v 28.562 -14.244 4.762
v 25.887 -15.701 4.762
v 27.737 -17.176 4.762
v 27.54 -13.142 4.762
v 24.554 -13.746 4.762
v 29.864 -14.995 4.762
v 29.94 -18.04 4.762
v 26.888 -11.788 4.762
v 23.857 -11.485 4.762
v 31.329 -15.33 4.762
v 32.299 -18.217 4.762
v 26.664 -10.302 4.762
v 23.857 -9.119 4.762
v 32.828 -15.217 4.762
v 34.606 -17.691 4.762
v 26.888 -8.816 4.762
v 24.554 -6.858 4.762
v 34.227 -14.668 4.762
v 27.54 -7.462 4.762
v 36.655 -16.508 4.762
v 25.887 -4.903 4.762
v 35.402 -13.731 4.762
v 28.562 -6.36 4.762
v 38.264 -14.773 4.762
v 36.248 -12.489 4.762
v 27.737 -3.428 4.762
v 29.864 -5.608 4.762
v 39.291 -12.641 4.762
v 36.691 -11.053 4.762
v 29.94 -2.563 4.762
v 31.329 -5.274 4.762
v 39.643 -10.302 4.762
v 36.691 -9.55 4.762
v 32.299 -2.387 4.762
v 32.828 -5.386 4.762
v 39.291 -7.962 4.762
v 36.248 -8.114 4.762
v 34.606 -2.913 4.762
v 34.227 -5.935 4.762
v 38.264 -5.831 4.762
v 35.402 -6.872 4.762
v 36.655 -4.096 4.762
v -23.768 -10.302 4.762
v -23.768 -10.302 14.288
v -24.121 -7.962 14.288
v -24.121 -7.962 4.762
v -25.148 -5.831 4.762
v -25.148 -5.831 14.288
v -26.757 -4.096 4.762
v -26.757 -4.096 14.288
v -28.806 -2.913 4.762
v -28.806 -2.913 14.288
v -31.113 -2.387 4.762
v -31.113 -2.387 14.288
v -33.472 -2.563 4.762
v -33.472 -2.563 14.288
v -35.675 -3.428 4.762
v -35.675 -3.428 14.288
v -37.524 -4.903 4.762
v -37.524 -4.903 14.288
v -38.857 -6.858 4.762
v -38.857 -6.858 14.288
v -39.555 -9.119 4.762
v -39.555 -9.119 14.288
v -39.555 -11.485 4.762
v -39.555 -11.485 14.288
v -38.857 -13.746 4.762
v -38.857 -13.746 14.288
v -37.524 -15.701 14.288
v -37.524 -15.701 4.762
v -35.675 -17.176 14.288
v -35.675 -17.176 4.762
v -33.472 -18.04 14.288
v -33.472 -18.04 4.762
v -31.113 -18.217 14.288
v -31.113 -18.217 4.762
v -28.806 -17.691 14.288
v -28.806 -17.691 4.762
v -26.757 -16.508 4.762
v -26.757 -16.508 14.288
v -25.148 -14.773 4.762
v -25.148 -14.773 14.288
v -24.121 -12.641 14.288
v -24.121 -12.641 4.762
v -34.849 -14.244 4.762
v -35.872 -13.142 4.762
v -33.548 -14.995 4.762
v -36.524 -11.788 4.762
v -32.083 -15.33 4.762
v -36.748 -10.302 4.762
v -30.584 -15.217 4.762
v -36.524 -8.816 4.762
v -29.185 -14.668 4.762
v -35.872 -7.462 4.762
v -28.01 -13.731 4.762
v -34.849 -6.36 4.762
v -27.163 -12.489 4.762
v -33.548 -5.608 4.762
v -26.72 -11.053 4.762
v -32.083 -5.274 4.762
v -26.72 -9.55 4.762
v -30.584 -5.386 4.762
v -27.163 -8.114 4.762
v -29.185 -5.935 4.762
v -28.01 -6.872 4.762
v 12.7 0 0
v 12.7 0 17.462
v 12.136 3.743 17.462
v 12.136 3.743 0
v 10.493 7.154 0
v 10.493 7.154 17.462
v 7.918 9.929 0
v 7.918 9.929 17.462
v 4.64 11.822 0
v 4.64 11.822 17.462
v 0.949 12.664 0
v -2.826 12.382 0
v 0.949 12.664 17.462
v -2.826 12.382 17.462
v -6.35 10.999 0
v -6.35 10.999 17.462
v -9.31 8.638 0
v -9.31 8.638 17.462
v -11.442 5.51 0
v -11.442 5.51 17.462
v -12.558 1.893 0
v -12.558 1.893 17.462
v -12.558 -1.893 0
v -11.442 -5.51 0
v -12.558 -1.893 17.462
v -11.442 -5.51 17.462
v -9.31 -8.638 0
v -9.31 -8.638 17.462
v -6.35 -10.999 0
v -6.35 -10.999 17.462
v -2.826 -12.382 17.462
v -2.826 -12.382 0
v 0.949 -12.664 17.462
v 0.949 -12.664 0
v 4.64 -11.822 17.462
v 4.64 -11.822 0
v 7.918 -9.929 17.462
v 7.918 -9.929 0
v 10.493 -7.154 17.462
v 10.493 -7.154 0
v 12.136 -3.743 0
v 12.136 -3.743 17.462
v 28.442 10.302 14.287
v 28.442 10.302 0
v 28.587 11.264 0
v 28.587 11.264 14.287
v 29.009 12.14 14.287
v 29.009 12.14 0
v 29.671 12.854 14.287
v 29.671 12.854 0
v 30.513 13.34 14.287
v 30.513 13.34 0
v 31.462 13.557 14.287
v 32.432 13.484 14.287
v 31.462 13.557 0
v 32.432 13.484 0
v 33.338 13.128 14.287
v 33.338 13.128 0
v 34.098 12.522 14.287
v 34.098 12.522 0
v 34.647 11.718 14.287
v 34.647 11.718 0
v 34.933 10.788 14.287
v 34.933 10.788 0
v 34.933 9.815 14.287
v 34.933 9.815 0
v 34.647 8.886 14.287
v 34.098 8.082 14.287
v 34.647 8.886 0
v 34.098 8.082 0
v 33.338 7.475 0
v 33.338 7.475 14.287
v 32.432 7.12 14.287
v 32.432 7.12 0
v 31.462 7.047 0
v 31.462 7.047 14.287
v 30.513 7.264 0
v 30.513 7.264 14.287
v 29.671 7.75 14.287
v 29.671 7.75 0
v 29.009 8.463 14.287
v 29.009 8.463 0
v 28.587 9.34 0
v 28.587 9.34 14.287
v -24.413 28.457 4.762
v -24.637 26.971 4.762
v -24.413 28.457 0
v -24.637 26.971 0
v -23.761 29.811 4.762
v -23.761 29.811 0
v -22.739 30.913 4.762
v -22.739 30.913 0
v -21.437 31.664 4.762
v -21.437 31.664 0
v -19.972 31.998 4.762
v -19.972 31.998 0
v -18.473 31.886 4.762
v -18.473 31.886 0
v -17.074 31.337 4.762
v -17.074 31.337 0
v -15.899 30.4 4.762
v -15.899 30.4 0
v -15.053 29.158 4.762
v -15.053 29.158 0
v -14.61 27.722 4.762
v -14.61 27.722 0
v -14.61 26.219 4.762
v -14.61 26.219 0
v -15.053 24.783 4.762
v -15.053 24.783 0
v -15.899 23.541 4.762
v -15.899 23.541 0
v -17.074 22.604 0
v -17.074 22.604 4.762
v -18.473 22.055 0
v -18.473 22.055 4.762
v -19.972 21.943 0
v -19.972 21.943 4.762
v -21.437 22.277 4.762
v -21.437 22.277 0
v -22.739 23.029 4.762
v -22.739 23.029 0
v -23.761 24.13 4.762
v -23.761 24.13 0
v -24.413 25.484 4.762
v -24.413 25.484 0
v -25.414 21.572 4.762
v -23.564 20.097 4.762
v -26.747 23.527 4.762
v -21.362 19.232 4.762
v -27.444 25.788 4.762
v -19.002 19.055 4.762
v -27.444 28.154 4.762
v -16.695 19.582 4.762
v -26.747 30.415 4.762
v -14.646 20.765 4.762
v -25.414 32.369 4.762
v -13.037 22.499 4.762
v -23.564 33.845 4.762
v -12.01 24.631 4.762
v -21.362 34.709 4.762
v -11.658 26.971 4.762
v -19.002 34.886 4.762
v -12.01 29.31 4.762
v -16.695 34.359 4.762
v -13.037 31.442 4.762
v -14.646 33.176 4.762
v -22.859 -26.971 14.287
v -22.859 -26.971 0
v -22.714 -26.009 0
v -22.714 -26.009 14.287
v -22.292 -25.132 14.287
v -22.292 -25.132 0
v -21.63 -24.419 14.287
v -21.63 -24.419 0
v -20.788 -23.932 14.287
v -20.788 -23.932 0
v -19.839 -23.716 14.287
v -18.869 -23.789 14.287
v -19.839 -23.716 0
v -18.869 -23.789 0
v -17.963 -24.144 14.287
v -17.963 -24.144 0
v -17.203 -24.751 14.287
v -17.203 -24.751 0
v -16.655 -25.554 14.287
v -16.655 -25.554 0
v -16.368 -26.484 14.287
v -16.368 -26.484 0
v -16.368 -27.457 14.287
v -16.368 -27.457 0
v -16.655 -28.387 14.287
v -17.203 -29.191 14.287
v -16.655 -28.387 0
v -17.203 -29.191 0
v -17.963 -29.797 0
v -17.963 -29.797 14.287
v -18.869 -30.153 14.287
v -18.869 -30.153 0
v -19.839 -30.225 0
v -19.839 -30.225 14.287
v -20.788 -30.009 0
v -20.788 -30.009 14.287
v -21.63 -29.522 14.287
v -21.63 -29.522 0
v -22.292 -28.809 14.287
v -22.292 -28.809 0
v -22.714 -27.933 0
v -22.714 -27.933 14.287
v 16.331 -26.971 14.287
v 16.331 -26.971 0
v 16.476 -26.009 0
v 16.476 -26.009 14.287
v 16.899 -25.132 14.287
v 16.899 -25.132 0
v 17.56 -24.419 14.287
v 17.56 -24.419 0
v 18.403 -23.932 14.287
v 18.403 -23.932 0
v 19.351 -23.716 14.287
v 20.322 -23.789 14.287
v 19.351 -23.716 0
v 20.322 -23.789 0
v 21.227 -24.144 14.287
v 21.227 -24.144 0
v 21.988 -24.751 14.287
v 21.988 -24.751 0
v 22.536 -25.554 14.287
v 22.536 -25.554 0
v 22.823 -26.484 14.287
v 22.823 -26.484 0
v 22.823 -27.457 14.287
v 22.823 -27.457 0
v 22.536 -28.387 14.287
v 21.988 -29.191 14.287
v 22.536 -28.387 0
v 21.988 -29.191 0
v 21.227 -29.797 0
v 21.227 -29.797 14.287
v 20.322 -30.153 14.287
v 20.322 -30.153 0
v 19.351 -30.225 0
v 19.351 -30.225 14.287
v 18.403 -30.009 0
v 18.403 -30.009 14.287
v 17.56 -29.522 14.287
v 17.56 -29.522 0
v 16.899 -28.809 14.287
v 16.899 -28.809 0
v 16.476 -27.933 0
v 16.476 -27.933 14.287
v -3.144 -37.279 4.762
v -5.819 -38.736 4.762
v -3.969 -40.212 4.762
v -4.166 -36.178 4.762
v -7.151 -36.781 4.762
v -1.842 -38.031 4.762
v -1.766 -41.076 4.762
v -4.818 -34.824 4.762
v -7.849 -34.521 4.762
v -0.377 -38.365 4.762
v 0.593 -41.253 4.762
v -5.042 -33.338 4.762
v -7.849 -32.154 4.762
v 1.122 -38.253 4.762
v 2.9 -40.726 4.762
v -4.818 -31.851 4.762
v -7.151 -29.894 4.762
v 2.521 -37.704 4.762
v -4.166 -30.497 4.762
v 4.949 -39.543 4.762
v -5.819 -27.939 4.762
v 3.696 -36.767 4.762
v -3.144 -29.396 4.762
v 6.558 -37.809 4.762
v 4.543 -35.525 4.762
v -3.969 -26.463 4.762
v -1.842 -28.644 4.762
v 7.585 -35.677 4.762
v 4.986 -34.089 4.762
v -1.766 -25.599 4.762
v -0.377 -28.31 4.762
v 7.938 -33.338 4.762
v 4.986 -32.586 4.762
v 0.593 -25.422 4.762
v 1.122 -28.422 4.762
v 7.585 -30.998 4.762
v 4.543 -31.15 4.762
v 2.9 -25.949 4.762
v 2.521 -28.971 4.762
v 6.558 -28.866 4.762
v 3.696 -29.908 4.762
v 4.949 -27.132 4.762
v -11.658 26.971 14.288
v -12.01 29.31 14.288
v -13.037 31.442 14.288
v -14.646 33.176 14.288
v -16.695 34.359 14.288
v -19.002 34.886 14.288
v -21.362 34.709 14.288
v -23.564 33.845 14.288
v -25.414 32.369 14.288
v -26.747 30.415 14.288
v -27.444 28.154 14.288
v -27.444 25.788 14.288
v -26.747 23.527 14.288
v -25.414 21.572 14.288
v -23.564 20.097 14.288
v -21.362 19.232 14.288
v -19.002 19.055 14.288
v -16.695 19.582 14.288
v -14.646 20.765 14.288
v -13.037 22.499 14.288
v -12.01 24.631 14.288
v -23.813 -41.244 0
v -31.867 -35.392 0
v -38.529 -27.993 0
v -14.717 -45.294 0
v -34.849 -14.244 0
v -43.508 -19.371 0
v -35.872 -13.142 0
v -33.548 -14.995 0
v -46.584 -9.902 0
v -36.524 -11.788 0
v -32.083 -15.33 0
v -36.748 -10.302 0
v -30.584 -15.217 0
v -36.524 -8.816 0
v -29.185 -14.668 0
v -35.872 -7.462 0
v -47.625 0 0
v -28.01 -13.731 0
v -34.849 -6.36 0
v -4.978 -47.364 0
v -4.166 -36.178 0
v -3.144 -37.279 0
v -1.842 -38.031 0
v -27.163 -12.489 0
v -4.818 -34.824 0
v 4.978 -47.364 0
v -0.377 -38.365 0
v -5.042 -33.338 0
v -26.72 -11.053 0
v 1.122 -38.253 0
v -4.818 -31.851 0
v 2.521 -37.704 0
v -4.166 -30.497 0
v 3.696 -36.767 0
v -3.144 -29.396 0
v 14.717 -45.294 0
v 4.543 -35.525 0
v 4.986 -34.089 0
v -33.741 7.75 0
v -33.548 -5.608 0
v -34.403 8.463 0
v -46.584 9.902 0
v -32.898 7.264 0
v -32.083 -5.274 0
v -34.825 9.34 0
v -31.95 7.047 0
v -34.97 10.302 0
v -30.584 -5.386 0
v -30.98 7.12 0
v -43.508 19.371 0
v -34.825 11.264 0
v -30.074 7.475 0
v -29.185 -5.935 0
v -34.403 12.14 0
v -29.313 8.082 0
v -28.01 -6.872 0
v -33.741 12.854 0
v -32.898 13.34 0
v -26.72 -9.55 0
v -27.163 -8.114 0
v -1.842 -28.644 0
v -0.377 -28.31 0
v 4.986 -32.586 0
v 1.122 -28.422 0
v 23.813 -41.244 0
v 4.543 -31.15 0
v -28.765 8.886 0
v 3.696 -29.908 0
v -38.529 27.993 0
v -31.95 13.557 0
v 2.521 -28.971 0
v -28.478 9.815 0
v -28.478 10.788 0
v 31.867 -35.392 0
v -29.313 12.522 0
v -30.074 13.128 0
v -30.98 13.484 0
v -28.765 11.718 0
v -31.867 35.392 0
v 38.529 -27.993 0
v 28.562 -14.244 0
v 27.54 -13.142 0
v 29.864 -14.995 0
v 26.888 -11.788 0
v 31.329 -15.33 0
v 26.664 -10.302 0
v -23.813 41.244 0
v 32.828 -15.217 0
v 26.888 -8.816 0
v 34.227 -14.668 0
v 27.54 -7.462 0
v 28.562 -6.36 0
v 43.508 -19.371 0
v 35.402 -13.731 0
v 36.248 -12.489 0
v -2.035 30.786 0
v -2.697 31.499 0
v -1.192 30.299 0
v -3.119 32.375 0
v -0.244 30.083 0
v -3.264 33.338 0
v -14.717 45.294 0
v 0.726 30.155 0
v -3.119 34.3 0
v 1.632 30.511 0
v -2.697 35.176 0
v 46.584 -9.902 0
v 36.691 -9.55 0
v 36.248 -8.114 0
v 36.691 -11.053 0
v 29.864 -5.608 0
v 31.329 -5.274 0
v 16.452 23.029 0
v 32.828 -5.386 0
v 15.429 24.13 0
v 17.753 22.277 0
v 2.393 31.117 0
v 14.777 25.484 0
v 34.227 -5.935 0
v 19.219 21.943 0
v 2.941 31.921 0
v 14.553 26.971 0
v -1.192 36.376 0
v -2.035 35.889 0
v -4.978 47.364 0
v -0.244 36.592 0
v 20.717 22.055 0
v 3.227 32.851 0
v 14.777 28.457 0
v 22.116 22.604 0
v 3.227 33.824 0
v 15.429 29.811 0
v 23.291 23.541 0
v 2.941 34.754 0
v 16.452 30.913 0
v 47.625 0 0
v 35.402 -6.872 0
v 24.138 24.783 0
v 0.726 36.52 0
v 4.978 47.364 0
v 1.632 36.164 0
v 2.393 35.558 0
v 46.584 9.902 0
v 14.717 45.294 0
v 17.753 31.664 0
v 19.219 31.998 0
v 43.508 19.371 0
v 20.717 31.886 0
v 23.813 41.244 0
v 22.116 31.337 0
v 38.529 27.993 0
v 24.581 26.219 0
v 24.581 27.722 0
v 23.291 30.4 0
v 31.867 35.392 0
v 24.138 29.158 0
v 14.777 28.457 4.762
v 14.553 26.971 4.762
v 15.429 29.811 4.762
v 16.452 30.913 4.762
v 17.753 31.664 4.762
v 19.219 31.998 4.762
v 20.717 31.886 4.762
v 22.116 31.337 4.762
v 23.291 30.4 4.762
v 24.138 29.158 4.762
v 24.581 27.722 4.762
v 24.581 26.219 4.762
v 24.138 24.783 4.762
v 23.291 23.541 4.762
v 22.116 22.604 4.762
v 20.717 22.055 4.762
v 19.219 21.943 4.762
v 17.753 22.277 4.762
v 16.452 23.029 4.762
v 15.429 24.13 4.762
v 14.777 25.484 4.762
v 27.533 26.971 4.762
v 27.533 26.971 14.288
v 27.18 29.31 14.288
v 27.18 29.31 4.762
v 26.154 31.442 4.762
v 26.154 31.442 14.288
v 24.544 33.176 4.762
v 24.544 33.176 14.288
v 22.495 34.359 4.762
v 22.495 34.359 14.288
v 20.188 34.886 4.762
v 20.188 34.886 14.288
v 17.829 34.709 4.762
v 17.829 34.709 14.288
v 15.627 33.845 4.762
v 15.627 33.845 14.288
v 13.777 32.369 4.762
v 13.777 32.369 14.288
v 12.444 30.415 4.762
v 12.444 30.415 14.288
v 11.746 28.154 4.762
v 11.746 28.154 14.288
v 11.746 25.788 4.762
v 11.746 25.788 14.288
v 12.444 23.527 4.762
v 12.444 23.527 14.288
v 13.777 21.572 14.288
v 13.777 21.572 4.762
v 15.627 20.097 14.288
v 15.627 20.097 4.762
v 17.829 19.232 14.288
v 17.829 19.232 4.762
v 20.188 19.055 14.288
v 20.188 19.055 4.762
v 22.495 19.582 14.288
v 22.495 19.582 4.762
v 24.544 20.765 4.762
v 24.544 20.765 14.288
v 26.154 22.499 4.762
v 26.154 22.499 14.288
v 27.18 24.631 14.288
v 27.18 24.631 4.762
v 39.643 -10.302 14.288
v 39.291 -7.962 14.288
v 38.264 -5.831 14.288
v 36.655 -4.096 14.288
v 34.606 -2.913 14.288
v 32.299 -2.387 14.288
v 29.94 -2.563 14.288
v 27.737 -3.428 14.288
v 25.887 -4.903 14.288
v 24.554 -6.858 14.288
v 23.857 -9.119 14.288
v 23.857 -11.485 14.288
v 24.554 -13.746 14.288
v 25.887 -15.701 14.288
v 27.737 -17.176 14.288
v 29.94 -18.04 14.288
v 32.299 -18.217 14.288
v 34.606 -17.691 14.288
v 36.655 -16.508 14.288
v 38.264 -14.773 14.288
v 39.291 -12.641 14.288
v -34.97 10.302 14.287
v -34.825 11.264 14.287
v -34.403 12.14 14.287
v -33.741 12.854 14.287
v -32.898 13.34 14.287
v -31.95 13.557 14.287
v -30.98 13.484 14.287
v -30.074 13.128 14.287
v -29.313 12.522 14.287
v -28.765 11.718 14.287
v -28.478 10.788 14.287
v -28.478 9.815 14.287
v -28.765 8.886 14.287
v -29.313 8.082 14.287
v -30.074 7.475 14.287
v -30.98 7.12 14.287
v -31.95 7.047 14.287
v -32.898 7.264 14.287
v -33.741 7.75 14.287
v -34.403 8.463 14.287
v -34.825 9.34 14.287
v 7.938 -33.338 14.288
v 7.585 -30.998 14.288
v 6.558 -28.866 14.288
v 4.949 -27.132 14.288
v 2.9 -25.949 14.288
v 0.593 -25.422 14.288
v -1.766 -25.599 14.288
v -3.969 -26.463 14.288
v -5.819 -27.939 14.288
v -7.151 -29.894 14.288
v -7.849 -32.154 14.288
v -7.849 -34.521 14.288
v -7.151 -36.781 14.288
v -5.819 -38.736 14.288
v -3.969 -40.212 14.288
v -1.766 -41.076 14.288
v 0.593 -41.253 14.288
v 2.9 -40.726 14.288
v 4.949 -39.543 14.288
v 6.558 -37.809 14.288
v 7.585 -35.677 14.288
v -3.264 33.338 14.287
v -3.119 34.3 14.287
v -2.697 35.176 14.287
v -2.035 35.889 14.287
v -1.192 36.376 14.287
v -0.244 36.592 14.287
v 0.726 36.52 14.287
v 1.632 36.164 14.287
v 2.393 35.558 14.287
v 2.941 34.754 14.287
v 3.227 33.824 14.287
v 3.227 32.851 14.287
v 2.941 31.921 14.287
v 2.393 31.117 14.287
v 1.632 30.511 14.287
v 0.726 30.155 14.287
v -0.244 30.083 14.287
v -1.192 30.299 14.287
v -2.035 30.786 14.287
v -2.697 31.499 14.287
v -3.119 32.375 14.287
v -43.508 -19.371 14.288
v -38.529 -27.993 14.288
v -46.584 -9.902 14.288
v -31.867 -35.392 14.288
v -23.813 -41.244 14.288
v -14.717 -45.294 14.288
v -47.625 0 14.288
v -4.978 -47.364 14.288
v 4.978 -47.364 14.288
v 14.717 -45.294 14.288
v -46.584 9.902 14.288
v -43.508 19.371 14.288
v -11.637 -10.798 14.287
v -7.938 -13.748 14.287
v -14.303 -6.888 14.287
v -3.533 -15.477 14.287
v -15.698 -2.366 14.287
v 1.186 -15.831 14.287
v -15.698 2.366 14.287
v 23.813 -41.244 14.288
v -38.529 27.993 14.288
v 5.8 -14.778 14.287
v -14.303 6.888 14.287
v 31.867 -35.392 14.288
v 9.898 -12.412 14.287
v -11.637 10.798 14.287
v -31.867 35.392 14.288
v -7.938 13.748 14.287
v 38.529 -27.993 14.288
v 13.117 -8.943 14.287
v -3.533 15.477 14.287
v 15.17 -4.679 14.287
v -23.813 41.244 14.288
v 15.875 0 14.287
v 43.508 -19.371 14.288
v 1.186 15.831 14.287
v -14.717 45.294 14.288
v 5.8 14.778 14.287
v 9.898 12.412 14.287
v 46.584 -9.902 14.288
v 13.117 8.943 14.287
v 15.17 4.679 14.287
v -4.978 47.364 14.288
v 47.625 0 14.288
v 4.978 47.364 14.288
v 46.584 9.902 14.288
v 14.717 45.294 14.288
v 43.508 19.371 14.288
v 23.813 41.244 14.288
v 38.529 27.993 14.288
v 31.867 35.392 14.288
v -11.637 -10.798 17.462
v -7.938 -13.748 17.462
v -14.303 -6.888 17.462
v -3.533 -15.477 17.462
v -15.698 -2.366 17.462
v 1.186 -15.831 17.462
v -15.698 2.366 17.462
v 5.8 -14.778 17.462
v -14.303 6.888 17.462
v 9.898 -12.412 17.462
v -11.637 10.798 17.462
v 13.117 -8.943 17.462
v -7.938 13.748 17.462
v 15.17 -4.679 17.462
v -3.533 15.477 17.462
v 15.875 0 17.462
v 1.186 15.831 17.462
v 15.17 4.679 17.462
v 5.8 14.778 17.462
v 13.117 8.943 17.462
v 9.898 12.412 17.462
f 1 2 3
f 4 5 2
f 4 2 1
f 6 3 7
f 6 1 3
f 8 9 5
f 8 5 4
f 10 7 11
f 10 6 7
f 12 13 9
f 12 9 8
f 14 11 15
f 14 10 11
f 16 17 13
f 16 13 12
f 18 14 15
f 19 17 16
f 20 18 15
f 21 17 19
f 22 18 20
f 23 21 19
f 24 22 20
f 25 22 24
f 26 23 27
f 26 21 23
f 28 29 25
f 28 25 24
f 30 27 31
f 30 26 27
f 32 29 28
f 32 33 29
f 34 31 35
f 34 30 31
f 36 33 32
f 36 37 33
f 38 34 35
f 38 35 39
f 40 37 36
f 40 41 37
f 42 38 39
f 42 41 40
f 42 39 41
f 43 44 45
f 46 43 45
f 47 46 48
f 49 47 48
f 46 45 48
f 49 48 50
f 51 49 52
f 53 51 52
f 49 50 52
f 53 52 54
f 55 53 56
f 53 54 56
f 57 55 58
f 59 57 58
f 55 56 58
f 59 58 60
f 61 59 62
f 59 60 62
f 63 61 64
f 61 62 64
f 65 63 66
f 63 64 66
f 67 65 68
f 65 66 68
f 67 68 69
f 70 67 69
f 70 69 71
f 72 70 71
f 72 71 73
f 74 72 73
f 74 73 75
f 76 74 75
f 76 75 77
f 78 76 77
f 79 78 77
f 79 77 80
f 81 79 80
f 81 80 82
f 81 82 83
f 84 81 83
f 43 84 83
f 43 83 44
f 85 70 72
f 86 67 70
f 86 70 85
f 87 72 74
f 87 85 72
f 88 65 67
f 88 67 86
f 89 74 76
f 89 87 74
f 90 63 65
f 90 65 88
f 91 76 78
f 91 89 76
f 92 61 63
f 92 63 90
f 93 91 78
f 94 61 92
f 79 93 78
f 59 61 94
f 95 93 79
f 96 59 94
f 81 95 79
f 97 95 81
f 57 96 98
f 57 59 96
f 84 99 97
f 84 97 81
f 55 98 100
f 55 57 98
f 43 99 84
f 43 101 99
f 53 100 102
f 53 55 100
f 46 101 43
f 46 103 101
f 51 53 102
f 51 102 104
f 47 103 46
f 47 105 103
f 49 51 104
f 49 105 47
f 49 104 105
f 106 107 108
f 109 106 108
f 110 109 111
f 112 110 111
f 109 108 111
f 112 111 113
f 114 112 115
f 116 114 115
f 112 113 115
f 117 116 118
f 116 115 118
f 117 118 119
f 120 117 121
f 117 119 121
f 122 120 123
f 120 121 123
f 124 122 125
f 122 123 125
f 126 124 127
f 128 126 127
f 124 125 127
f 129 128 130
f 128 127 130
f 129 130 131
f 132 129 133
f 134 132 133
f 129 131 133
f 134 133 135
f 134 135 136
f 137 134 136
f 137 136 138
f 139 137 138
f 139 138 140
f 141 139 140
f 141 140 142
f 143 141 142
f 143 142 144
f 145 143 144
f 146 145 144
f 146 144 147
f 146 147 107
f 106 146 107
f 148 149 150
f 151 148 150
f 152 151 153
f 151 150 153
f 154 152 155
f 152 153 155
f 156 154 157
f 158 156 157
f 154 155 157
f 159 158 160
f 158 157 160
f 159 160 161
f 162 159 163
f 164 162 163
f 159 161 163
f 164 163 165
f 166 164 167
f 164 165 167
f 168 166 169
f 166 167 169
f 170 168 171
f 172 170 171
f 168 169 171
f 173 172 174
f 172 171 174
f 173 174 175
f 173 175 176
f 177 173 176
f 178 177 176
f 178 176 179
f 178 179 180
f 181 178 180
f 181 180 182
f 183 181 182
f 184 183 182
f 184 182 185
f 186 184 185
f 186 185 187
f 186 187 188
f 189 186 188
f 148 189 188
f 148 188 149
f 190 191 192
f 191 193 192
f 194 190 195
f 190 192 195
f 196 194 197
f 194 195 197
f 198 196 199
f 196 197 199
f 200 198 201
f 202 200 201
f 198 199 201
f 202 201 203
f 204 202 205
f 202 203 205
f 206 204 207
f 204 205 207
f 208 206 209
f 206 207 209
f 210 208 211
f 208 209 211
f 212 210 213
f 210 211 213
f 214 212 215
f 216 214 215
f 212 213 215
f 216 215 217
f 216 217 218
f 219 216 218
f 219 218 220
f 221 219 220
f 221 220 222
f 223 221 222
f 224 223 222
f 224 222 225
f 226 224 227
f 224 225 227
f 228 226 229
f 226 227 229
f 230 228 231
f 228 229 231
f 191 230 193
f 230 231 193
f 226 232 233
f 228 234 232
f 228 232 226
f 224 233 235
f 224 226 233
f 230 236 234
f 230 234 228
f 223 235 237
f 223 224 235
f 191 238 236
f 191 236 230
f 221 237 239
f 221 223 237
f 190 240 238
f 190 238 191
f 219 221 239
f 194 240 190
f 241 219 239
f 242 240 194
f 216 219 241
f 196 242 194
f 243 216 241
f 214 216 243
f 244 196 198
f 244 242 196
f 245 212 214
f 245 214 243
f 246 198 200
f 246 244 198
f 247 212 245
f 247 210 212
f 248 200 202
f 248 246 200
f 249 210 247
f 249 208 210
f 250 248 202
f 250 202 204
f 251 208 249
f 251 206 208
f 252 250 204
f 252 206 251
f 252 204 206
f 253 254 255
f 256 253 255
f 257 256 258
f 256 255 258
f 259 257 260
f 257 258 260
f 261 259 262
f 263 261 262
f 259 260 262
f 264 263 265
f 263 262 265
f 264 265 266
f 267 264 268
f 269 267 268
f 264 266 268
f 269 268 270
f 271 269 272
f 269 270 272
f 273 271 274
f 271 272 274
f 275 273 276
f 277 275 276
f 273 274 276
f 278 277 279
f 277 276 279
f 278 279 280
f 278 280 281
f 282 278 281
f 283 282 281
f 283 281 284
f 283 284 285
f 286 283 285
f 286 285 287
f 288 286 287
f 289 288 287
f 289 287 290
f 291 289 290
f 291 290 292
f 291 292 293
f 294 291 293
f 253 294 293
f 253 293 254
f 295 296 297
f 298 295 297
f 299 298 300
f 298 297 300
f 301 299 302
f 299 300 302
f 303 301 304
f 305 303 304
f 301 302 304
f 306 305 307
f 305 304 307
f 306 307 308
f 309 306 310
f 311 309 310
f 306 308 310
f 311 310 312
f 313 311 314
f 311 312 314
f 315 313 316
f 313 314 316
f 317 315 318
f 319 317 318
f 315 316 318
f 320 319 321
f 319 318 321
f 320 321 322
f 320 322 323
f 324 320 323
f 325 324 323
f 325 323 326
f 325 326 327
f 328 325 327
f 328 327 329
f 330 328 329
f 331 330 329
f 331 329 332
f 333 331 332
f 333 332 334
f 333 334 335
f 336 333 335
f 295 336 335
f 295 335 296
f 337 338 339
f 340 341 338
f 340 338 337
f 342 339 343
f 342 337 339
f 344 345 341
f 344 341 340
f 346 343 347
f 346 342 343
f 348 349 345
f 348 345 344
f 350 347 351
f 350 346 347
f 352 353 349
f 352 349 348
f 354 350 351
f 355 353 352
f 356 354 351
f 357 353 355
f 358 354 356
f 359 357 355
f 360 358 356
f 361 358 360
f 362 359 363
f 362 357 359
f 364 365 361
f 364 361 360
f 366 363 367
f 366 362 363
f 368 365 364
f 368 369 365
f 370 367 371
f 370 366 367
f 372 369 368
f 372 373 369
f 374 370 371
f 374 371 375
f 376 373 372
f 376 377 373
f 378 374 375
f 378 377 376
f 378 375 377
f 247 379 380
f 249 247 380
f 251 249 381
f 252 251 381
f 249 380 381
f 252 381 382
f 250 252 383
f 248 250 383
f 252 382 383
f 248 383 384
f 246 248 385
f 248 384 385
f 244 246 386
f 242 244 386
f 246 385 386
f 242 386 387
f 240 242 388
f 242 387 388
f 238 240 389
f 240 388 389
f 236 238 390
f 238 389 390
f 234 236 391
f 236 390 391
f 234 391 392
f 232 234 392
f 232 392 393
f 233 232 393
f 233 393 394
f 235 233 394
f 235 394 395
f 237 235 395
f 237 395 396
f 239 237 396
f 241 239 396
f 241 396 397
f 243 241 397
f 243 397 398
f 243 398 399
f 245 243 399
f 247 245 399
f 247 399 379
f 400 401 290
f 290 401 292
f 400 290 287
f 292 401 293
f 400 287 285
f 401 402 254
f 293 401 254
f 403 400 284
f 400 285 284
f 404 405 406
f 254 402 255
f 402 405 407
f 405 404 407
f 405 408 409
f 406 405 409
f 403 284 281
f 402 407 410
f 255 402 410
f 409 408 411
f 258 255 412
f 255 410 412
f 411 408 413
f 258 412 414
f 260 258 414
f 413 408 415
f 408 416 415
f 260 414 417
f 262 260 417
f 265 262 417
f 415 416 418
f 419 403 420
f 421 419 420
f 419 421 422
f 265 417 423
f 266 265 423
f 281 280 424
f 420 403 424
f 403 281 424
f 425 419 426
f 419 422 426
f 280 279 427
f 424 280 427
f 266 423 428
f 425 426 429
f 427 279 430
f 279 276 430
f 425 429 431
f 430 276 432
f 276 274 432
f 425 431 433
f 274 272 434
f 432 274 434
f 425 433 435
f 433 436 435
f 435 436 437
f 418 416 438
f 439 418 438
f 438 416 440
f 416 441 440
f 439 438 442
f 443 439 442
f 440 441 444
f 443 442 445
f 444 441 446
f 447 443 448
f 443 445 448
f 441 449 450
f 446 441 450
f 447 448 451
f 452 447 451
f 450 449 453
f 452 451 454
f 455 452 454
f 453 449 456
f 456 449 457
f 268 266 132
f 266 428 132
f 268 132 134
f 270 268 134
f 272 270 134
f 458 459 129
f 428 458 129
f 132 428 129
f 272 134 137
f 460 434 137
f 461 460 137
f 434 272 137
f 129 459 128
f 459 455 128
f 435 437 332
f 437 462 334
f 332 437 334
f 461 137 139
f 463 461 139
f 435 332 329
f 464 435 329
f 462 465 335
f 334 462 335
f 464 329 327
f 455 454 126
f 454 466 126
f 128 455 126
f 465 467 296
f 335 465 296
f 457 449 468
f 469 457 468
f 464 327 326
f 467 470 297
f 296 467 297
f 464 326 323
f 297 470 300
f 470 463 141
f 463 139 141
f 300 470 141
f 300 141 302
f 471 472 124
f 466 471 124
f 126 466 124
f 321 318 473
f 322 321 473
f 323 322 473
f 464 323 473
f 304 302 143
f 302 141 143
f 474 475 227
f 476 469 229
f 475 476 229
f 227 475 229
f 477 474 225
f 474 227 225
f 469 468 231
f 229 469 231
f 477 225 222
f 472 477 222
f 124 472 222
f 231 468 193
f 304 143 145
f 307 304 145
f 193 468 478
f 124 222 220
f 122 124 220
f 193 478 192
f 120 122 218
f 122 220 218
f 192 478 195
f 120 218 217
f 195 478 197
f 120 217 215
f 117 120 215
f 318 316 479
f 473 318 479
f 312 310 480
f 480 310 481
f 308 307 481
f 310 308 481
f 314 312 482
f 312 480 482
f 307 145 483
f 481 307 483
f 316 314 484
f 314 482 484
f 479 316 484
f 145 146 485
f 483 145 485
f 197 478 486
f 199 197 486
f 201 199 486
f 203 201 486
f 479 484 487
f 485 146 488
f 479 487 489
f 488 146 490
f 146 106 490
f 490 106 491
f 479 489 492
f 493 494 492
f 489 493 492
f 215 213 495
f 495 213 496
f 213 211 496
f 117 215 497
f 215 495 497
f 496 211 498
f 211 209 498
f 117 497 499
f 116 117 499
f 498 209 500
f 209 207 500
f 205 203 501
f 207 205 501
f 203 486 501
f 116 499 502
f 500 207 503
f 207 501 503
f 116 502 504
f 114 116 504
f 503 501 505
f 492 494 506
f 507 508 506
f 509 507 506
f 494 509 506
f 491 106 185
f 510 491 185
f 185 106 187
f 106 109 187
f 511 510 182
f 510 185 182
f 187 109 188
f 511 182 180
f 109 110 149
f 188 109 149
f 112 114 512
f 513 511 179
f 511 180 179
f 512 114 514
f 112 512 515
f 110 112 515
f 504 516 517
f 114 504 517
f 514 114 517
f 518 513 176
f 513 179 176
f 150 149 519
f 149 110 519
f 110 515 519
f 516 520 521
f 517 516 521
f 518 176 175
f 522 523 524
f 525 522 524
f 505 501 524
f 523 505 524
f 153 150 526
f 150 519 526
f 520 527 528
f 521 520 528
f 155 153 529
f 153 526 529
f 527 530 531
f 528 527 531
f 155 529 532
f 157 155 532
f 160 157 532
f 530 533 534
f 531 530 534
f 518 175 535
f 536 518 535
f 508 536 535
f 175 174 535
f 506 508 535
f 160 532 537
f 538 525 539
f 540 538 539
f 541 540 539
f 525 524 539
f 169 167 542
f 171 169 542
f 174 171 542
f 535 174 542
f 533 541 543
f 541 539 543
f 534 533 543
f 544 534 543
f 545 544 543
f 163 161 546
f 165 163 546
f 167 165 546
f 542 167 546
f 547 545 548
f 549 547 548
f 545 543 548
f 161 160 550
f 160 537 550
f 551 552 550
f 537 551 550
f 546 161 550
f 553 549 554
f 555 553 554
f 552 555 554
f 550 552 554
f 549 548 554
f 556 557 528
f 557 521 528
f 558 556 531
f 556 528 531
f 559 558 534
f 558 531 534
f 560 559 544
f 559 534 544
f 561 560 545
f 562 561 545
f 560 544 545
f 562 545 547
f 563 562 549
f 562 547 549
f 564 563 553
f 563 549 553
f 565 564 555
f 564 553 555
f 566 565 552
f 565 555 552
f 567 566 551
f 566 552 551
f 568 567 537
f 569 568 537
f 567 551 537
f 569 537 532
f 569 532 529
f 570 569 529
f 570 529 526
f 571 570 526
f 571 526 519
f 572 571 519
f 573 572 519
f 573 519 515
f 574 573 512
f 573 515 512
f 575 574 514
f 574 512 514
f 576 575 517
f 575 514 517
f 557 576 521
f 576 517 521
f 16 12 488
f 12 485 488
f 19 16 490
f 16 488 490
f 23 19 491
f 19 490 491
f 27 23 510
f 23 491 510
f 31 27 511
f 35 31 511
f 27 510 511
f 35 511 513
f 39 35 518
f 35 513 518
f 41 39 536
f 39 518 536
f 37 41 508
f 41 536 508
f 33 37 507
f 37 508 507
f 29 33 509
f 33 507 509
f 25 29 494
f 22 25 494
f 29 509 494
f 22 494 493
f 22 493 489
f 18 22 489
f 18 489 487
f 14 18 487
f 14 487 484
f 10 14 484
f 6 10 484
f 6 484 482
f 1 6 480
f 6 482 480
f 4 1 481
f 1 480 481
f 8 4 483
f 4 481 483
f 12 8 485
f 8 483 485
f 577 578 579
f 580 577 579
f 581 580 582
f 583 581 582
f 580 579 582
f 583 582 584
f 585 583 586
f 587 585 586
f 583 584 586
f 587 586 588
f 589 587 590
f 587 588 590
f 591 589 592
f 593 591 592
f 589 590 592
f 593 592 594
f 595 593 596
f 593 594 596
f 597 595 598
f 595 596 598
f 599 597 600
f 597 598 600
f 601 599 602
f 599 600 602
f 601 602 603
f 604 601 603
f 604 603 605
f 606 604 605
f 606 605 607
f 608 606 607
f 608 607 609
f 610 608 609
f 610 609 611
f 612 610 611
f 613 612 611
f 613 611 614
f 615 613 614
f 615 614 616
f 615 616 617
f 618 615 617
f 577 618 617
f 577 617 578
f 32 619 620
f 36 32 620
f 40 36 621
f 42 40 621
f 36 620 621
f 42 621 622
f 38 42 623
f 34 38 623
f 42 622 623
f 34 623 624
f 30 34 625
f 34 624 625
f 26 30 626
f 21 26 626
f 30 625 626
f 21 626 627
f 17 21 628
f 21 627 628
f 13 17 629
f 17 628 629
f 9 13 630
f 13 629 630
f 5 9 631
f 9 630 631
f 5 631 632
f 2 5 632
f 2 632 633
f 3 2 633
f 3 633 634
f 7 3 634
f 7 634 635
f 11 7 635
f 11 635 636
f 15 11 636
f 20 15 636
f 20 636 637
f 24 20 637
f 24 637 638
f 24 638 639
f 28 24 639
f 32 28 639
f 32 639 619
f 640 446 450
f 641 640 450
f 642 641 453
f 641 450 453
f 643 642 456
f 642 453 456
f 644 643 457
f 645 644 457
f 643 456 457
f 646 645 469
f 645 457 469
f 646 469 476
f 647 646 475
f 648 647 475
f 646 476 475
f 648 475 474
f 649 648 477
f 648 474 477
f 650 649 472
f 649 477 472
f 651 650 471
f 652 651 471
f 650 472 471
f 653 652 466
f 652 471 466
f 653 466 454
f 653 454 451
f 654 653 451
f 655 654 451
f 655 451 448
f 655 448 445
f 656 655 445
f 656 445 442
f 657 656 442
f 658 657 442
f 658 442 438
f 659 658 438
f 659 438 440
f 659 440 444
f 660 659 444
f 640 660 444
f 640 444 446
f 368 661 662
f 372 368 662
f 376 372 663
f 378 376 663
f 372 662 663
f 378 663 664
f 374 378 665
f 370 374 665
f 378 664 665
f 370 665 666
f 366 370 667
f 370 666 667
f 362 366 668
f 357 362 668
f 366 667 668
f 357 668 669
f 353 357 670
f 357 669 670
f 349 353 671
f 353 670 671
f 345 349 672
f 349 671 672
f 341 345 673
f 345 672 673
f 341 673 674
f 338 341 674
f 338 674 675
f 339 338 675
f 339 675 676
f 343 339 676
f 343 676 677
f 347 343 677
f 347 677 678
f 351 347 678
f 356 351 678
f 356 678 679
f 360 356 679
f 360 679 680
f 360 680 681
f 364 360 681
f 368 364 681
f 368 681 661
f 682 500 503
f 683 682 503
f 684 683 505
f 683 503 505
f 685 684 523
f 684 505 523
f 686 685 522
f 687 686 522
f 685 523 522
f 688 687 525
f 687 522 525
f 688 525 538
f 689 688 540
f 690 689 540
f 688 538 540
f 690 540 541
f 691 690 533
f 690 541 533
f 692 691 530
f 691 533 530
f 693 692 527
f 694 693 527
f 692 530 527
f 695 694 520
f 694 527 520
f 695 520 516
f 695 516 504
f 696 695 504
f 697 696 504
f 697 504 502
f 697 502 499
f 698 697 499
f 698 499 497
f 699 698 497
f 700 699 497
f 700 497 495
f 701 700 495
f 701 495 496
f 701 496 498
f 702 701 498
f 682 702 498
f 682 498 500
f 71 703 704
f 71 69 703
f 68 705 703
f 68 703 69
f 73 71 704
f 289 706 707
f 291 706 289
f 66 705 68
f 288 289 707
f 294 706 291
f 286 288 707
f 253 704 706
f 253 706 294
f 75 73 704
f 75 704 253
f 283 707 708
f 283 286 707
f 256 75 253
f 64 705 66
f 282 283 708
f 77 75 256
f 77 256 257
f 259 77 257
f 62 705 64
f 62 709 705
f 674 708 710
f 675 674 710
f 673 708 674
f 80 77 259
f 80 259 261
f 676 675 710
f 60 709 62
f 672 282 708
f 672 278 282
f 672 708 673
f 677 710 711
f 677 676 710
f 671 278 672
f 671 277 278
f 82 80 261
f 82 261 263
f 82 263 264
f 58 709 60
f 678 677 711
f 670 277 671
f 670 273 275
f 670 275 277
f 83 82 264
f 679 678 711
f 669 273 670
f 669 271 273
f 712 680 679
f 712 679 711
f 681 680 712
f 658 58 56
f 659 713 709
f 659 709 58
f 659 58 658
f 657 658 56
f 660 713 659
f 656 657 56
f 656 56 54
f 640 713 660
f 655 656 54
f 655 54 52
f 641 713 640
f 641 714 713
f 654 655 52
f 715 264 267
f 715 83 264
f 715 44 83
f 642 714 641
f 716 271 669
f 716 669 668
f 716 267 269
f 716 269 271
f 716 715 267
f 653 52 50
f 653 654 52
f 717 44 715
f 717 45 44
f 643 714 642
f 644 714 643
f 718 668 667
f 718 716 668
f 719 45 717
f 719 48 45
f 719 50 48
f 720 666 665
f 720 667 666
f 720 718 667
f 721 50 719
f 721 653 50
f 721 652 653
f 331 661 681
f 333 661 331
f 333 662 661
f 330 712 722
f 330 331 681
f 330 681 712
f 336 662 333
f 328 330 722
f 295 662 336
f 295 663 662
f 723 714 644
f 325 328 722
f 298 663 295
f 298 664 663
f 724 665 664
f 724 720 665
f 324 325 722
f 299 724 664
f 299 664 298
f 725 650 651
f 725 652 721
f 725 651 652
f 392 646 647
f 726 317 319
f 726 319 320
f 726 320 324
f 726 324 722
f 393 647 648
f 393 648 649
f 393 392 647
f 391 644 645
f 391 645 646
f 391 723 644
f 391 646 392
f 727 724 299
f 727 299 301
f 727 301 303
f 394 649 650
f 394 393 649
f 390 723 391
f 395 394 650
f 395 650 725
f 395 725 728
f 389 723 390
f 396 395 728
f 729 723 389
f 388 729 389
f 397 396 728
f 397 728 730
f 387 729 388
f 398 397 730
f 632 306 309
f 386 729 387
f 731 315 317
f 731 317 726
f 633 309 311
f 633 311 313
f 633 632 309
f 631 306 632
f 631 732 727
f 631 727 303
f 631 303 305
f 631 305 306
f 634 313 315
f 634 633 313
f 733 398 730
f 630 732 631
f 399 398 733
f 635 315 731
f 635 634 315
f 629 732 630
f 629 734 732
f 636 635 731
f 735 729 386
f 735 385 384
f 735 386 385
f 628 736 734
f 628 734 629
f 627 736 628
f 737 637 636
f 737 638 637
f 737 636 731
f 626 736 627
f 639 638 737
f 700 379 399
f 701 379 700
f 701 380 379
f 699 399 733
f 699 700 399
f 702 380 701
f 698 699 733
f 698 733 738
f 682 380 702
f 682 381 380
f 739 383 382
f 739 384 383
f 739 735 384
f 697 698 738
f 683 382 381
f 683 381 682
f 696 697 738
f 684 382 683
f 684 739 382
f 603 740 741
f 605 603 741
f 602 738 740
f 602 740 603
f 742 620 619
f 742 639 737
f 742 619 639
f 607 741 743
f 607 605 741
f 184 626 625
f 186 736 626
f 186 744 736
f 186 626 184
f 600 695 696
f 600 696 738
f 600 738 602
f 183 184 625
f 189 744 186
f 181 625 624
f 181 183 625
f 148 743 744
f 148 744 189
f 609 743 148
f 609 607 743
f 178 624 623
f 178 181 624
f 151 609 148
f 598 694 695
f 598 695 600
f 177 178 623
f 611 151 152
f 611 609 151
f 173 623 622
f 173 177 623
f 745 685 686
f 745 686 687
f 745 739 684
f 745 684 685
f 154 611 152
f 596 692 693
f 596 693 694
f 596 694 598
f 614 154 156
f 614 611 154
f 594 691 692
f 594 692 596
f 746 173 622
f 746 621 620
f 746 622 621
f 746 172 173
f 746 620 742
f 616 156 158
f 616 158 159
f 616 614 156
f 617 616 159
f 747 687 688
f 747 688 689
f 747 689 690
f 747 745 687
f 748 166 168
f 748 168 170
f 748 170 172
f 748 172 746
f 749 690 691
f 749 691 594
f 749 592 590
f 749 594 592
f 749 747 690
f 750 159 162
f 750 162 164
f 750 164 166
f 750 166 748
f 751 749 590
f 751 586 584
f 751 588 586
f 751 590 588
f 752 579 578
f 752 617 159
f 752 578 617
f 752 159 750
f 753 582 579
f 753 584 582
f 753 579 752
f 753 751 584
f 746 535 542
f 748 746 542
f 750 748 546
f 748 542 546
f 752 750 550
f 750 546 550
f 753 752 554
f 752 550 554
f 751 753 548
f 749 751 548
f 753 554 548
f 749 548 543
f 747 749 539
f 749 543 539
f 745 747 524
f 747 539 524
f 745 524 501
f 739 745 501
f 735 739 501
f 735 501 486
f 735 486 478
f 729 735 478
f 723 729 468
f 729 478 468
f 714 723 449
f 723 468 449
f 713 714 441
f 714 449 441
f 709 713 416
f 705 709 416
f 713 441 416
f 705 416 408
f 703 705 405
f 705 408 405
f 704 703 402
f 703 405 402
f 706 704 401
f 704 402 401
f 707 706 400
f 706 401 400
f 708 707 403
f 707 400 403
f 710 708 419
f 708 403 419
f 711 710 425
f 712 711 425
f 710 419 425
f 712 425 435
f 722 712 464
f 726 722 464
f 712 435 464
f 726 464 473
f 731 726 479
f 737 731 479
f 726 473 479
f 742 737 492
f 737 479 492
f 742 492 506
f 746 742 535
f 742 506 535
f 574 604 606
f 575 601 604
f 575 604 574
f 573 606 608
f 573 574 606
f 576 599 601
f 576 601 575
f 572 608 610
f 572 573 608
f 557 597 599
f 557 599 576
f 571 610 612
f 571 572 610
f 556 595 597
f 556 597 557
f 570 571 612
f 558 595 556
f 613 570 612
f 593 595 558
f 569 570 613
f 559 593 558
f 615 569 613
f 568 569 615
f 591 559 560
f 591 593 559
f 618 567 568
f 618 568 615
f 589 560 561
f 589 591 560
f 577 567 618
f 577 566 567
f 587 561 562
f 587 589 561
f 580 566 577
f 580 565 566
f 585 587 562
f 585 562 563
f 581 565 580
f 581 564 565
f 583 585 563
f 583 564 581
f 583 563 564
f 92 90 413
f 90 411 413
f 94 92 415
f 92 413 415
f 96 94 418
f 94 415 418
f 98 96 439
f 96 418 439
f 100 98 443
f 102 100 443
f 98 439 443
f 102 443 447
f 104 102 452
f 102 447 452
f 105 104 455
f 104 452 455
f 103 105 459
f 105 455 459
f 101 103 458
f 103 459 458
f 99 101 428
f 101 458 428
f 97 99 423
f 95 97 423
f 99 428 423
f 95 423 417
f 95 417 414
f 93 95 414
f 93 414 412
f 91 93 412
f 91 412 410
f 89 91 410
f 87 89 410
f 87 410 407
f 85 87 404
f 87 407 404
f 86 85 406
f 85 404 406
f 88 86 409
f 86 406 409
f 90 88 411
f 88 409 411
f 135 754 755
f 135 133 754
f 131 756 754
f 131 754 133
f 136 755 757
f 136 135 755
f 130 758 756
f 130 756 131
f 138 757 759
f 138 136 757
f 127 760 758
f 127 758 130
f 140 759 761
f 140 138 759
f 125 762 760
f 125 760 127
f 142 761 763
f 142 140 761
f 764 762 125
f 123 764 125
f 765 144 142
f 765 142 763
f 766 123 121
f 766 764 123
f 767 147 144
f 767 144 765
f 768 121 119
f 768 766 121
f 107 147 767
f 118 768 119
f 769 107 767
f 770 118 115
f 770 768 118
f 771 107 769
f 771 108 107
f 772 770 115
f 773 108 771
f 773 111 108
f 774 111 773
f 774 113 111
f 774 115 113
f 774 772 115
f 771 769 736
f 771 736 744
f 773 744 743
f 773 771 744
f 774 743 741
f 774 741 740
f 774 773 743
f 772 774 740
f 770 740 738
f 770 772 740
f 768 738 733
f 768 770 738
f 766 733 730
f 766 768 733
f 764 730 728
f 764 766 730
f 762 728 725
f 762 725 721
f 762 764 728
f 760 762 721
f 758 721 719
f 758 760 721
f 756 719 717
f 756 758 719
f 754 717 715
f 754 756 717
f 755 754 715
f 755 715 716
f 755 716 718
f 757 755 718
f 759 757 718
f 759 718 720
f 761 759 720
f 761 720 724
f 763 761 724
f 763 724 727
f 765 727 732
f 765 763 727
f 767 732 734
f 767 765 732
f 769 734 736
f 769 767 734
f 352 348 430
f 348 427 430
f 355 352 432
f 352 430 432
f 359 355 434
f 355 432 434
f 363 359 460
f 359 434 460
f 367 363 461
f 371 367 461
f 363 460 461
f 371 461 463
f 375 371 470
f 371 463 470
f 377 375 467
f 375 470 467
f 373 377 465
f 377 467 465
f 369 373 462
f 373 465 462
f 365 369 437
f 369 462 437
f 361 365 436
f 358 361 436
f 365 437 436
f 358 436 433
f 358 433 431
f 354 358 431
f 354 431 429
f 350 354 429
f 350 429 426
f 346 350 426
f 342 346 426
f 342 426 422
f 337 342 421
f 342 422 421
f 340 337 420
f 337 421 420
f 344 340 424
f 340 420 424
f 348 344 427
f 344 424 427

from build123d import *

# Parameters (mm, degrees)
SKETCH1_R                                        = 47.625
BOSS_EXTRUDE1_DEPTH                              = 14.2875
SKETCH2_R                                        = 12.7
CUT_EXTRUDE1_DEPTH                               = 69.850663804
BOSS_EXTRUDE2_START                              = 3.175
SKETCH3_R                                        = 15.875
SKETCH3_R_2                                      = 12.7
BOSS_EXTRUDE2_DEPTH                              = 3.175
CBORE_FOR_3_8_SOCKET_HEAD_CAP_SCREW1_D           = 10.0838
CBORE_FOR_3_8_SOCKET_HEAD_CAP_SCREW1_CBORE_D     = 15.875
CBORE_FOR_3_8_SOCKET_HEAD_CAP_SCREW1_CBORE_DEPTH = 9.525
F_5_16_18_TAPPED_HOLE1_D                         = 6.5278


with BuildPart() as part:
    # Sketch1 → Boss-Extrude1 (new body)
    with BuildSketch(Plane.XY):
        Circle(SKETCH1_R)
    extrude(amount=BOSS_EXTRUDE1_DEPTH)

    # Sketch2 → Cut-Extrude1 (cut, through all)
    with BuildSketch(Plane.XY.offset(14.2875)):
        Circle(SKETCH2_R)
    extrude(amount=-CUT_EXTRUDE1_DEPTH, mode=Mode.SUBTRACT)

    # Sketch3 → Boss-Extrude2 (add)
    with BuildSketch(Plane.XY.offset(14.2875).offset(BOSS_EXTRUDE2_START)):
        Circle(SKETCH3_R)
        Circle(SKETCH3_R_2, mode=Mode.SUBTRACT)
    extrude(amount=-BOSS_EXTRUDE2_DEPTH)

    # CBORE for 3/8 Socket Head Cap Screw1 (through all)
    with Locations(Plane.XY.offset(14.2875)):
        with Locations((0, -33.3375), (-31.705846612, -10.30185405), (-19.595290848, 26.97060405), (19.595290848, 26.97060405), (31.705846612, -10.30185405), (0, 0)):
            CounterBoreHole(CBORE_FOR_3_8_SOCKET_HEAD_CAP_SCREW1_D / 2, CBORE_FOR_3_8_SOCKET_HEAD_CAP_SCREW1_CBORE_D / 2, CBORE_FOR_3_8_SOCKET_HEAD_CAP_SCREW1_CBORE_DEPTH)

    # 5/16-18 Tapped Hole1 (through all)
    with Locations(Plane.XY.offset(14.2875)):
        with Locations((-19.595290848, -26.97060405), (-31.705846612, 10.30185405), (0, 33.3375), (31.705846612, 10.30185405), (19.595290848, -26.97060405), (0, 0)):
            Hole(F_5_16_18_TAPPED_HOLE1_D / 2)


solid = part.part
